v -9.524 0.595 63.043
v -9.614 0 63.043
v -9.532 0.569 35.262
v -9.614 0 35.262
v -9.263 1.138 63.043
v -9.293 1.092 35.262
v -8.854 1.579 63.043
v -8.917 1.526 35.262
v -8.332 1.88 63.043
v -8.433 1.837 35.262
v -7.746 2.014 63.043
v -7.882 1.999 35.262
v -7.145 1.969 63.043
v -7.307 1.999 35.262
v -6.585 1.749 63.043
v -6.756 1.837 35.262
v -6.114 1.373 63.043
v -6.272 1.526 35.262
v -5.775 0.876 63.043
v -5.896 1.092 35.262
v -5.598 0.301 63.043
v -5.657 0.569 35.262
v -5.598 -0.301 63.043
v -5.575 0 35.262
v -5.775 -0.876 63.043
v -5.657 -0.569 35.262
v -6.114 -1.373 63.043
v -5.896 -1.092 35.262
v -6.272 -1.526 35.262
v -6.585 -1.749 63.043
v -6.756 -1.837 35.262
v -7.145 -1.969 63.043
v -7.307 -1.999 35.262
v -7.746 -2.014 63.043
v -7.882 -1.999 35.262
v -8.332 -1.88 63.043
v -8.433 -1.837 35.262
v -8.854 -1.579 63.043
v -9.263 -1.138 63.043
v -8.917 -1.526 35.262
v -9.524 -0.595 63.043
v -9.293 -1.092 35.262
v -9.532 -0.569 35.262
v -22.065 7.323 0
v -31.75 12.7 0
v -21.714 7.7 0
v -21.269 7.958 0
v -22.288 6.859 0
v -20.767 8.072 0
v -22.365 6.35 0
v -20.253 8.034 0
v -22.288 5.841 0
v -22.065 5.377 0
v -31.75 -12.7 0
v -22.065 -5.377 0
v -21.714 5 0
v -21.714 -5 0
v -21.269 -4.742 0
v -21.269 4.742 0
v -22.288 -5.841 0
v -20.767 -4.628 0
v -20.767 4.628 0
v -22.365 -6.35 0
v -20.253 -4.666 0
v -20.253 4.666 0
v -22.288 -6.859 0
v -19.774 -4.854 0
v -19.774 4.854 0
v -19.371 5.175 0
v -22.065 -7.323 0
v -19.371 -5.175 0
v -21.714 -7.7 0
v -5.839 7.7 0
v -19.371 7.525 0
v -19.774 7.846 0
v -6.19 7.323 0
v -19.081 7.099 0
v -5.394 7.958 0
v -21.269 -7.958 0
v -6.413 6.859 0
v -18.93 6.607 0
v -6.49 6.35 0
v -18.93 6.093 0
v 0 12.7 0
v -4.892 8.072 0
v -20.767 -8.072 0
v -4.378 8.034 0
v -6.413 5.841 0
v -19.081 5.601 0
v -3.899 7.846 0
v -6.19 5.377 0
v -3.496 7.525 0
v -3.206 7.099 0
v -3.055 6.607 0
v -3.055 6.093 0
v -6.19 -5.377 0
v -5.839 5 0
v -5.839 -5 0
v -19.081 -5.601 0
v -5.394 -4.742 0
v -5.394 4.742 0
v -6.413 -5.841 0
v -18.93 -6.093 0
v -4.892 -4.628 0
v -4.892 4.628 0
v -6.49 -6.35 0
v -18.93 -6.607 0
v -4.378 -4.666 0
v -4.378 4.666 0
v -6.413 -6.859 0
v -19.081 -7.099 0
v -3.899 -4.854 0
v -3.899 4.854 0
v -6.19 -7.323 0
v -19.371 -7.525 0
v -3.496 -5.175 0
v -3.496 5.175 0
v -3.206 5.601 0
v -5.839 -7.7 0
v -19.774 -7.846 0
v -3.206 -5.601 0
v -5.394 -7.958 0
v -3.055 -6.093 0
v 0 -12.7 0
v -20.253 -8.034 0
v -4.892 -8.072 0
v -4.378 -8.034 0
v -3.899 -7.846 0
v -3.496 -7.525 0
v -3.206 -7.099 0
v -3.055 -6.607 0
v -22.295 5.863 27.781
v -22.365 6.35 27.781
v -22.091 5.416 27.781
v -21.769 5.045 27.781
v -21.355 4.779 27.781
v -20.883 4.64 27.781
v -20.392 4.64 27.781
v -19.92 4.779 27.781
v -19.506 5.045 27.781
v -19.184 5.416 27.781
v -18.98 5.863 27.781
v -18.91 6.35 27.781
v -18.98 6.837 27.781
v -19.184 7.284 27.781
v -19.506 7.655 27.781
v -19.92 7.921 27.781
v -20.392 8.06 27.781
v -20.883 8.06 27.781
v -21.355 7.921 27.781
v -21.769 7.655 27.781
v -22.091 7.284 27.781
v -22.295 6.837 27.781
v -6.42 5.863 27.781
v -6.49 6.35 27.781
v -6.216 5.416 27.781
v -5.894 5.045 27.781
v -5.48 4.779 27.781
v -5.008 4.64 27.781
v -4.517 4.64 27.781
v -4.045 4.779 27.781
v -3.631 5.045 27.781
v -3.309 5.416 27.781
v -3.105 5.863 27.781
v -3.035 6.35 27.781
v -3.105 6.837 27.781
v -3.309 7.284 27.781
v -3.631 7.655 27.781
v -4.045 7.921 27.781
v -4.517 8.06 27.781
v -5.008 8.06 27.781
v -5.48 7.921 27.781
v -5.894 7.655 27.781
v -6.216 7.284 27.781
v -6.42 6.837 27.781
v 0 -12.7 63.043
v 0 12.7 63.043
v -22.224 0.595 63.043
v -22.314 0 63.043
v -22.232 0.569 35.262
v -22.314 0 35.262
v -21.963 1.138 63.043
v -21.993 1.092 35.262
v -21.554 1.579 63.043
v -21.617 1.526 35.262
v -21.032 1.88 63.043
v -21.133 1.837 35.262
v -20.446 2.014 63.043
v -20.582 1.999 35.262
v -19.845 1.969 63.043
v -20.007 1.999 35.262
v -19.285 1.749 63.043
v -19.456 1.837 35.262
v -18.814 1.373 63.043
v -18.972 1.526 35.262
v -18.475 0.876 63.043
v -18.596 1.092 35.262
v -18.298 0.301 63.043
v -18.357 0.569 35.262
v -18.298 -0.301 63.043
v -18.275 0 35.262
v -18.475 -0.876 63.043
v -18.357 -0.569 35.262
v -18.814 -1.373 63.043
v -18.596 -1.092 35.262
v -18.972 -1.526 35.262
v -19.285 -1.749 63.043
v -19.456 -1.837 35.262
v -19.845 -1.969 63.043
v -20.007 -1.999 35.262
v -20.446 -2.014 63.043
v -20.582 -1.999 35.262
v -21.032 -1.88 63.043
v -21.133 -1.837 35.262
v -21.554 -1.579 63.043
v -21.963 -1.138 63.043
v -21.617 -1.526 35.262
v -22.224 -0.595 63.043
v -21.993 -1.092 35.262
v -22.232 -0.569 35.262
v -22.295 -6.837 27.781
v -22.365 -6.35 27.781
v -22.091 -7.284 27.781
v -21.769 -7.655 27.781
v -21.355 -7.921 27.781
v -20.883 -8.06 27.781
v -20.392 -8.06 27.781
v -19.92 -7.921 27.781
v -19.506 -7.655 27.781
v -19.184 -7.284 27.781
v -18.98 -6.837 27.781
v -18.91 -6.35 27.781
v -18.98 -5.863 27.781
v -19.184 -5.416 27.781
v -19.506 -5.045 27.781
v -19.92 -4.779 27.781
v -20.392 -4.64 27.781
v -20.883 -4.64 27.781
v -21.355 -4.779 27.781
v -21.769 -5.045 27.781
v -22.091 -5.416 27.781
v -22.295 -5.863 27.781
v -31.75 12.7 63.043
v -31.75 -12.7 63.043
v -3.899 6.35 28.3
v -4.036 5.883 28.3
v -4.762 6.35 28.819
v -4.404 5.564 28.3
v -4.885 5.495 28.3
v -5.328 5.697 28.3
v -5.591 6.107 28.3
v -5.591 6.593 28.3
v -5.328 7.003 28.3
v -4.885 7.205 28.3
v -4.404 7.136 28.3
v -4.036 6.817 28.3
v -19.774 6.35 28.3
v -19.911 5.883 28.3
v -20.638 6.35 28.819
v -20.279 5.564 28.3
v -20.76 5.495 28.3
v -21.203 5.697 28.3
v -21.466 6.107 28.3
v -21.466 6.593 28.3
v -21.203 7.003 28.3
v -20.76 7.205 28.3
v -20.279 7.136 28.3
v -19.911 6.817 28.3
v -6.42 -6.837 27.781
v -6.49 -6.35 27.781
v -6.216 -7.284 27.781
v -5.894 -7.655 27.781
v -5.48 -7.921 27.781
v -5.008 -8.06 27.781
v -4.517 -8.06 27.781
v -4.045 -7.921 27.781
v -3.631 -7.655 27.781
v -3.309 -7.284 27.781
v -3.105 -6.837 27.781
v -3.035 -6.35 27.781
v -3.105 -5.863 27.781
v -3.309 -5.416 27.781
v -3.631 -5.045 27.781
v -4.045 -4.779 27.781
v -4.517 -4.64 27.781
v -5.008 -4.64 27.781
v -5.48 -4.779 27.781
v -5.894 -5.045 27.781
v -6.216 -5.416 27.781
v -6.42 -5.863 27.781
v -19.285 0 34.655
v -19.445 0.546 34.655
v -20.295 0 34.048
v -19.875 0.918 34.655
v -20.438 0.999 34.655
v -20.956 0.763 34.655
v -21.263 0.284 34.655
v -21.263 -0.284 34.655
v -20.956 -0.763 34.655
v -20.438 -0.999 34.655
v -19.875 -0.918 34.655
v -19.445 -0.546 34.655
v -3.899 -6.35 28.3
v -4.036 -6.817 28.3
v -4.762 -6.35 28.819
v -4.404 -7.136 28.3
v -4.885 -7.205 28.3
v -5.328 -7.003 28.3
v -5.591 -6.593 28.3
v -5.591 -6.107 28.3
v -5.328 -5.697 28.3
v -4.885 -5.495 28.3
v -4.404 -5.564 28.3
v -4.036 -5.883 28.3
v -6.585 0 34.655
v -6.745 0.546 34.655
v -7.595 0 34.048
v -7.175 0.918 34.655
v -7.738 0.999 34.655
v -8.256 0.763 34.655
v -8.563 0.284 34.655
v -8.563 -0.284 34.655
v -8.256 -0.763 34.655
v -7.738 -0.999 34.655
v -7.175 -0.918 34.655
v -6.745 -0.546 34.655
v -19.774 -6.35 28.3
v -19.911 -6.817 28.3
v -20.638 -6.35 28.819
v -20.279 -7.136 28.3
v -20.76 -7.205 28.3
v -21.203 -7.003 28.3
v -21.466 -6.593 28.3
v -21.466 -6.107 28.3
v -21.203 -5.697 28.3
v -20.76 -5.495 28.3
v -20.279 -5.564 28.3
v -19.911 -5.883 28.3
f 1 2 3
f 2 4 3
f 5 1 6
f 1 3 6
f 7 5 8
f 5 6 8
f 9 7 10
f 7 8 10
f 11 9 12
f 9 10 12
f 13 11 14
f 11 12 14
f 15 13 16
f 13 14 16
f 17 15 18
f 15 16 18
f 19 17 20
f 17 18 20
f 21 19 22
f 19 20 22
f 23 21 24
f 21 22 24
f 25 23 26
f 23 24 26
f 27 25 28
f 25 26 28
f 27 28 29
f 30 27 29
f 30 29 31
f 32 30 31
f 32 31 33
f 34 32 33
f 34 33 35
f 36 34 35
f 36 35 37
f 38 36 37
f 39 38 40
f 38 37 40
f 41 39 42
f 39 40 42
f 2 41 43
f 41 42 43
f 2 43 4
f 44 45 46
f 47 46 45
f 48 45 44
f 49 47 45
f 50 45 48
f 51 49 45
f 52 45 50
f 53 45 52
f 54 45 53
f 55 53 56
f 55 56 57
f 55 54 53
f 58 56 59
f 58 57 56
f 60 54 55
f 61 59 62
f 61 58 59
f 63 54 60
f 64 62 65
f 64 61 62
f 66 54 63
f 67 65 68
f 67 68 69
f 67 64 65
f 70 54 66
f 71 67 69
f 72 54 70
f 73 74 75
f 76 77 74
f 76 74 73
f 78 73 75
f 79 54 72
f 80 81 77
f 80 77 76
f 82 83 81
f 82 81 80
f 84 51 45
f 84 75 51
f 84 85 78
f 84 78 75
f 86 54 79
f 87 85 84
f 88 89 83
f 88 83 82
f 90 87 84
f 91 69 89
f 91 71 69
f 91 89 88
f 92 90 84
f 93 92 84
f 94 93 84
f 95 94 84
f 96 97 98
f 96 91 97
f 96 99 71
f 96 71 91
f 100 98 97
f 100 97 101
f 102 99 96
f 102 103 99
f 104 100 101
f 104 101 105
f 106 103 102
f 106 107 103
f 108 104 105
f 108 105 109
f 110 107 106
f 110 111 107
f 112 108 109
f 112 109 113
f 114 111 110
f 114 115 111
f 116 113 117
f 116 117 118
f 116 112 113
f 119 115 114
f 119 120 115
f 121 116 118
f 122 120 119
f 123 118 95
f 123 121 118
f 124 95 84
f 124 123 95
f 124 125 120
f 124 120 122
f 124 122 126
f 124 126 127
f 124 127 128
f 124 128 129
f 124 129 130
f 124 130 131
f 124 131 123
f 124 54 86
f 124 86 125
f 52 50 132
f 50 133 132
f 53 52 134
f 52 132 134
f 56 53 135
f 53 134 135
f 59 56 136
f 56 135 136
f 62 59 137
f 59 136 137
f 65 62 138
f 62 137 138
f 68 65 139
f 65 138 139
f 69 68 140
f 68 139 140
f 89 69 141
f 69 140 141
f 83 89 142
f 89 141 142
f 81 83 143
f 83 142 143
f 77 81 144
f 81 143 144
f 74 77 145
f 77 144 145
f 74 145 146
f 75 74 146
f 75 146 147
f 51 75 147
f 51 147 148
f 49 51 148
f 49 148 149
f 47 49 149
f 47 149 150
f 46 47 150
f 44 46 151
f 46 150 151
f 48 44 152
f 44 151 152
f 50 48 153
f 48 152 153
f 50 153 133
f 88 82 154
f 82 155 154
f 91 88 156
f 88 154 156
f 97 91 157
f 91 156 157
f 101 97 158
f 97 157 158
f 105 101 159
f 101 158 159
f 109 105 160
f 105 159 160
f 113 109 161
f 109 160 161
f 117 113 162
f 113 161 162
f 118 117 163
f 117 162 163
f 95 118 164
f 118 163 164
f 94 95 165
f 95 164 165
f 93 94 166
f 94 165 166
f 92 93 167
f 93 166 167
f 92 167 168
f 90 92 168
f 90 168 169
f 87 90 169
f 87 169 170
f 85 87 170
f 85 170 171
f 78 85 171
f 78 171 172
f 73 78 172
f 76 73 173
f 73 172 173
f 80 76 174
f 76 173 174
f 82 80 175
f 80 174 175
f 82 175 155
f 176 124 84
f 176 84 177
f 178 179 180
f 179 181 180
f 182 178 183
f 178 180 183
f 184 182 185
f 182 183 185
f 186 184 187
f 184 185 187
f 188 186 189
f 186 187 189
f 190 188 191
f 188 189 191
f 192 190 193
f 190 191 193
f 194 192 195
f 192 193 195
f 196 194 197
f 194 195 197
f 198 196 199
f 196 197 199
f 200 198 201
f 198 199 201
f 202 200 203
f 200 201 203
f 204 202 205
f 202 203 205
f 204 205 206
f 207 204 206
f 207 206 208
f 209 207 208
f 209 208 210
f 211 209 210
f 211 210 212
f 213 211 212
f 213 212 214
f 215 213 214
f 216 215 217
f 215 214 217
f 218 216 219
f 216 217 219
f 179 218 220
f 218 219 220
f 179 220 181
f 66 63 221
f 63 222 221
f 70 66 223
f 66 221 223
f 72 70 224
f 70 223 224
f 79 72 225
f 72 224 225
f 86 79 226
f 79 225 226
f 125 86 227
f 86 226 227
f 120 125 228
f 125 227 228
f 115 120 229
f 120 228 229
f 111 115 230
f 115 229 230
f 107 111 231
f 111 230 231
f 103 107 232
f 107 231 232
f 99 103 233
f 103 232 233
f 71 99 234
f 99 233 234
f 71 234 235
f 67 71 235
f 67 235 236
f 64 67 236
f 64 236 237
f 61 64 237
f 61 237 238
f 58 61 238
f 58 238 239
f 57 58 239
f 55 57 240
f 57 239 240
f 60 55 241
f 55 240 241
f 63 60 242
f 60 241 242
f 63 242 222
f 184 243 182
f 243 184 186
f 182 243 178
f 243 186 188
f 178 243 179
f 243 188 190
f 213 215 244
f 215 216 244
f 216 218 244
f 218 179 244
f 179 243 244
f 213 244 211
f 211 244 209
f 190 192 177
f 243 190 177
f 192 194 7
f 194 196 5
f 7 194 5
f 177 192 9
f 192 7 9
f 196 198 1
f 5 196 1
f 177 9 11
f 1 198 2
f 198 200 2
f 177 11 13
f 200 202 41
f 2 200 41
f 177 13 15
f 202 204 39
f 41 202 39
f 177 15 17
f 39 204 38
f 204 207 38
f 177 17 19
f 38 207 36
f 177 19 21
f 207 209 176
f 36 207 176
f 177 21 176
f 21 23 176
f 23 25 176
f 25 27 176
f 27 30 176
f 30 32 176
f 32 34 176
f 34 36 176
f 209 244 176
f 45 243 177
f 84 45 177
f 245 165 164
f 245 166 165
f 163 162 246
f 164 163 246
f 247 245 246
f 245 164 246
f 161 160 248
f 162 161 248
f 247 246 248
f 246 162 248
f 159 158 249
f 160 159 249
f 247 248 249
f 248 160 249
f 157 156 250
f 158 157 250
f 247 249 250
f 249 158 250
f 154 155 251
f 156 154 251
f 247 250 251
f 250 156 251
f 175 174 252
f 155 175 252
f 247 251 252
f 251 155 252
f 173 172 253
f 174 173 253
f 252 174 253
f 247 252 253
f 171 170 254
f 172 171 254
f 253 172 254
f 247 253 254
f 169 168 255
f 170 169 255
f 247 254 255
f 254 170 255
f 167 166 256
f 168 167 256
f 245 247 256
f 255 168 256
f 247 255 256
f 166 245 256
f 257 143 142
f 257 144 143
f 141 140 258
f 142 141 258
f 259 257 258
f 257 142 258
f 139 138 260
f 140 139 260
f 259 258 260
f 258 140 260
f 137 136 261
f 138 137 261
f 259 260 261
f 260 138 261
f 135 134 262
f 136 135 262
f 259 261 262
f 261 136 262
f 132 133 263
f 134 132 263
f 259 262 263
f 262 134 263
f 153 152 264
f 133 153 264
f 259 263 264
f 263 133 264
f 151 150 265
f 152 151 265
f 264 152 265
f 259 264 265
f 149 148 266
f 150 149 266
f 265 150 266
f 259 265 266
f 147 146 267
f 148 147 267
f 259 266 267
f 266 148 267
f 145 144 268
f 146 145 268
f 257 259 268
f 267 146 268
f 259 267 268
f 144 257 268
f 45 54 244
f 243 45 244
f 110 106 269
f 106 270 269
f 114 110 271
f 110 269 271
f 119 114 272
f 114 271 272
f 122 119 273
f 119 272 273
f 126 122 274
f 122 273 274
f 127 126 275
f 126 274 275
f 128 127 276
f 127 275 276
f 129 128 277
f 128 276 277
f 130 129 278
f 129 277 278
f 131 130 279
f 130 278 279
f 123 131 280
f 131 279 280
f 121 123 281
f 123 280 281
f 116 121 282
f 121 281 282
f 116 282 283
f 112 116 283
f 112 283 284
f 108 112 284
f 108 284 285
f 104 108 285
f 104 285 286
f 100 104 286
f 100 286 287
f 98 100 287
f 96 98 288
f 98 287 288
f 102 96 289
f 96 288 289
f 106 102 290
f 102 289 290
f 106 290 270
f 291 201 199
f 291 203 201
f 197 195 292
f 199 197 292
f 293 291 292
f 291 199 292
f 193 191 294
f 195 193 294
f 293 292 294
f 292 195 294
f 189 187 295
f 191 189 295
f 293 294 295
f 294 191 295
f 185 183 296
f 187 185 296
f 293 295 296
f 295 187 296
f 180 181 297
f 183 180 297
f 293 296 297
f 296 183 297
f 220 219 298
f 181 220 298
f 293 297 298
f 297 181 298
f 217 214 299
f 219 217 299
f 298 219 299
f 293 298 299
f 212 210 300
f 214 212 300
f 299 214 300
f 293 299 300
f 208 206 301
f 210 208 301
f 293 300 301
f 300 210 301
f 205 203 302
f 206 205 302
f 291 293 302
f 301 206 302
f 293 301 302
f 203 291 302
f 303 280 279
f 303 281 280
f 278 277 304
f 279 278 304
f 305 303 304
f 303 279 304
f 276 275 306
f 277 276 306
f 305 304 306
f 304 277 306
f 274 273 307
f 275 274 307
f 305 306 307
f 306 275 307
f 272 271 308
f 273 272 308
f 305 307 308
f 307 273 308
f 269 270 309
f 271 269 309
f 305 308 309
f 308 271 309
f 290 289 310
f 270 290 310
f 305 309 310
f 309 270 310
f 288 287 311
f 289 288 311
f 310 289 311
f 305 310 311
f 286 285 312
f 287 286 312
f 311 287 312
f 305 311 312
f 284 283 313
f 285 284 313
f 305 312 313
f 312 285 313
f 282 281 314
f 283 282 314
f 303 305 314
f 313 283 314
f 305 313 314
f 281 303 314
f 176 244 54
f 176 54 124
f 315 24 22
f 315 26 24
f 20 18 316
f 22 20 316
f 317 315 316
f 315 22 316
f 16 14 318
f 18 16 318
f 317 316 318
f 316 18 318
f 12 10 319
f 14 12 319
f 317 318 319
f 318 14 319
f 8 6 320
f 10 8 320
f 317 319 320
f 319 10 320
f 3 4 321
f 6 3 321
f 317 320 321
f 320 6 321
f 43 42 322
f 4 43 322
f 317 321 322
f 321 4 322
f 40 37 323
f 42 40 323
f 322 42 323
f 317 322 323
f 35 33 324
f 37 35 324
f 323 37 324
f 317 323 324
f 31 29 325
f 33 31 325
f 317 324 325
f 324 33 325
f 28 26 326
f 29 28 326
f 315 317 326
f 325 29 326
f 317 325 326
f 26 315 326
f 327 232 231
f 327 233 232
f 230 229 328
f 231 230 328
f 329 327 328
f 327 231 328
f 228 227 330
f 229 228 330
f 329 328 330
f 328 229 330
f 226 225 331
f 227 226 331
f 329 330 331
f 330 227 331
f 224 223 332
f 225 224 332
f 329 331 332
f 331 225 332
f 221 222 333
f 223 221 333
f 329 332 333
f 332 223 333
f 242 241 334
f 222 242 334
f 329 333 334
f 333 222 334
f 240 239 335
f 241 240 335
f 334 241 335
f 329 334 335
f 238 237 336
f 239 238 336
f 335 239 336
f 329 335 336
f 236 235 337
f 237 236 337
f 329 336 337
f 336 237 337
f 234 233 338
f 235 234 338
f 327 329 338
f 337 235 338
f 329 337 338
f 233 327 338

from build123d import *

# Parameters (mm, degrees)
F0_W     = 31.75
F0_H     = 63.0428
F1_DEPTH = 12.7
F3_D     = 3.4544
F3_DEPTH = 27.78125
F3_TIP   = 1.0378064612
F5_D     = 4.0386
F5_DEPTH = 27.78125
F5_TIP   = 1.213317848


with BuildPart() as f1:
    # F0 (on Front) → F1 (new body, symmetric)
    with BuildSketch(Plane.XZ):
        with Locations((-15.875, 31.5214)):
            Rectangle(F0_W, F0_H)
    extrude(amount=F1_DEPTH, both=True)

    # F3
    with Locations(Plane(origin=(0, 0, 0), x_dir=(1, 0, 0), z_dir=(0, 0, -1))):
        with Locations((-20.6375, 6.35), (-4.7625, 6.35), (-4.7625, -6.35), (-20.6375, -6.35)):
            Hole(F3_D / 2, depth=F3_DEPTH)
            with Locations((0, 0, -(F3_DEPTH + F3_TIP / 2))):  # 118° drill point
                Cone(0, F3_D / 2, F3_TIP, mode=Mode.SUBTRACT)

    # F5
    with Locations(Plane.XY.offset(63.0428)):
        with Locations((-7.5946, 0), (-20.2946, 0)):
            Hole(F5_D / 2, depth=F5_DEPTH)
            with Locations((0, 0, -(F5_DEPTH + F5_TIP / 2))):  # 118° drill point
                Cone(0, F5_D / 2, F5_TIP, mode=Mode.SUBTRACT)


solid = f1.part
